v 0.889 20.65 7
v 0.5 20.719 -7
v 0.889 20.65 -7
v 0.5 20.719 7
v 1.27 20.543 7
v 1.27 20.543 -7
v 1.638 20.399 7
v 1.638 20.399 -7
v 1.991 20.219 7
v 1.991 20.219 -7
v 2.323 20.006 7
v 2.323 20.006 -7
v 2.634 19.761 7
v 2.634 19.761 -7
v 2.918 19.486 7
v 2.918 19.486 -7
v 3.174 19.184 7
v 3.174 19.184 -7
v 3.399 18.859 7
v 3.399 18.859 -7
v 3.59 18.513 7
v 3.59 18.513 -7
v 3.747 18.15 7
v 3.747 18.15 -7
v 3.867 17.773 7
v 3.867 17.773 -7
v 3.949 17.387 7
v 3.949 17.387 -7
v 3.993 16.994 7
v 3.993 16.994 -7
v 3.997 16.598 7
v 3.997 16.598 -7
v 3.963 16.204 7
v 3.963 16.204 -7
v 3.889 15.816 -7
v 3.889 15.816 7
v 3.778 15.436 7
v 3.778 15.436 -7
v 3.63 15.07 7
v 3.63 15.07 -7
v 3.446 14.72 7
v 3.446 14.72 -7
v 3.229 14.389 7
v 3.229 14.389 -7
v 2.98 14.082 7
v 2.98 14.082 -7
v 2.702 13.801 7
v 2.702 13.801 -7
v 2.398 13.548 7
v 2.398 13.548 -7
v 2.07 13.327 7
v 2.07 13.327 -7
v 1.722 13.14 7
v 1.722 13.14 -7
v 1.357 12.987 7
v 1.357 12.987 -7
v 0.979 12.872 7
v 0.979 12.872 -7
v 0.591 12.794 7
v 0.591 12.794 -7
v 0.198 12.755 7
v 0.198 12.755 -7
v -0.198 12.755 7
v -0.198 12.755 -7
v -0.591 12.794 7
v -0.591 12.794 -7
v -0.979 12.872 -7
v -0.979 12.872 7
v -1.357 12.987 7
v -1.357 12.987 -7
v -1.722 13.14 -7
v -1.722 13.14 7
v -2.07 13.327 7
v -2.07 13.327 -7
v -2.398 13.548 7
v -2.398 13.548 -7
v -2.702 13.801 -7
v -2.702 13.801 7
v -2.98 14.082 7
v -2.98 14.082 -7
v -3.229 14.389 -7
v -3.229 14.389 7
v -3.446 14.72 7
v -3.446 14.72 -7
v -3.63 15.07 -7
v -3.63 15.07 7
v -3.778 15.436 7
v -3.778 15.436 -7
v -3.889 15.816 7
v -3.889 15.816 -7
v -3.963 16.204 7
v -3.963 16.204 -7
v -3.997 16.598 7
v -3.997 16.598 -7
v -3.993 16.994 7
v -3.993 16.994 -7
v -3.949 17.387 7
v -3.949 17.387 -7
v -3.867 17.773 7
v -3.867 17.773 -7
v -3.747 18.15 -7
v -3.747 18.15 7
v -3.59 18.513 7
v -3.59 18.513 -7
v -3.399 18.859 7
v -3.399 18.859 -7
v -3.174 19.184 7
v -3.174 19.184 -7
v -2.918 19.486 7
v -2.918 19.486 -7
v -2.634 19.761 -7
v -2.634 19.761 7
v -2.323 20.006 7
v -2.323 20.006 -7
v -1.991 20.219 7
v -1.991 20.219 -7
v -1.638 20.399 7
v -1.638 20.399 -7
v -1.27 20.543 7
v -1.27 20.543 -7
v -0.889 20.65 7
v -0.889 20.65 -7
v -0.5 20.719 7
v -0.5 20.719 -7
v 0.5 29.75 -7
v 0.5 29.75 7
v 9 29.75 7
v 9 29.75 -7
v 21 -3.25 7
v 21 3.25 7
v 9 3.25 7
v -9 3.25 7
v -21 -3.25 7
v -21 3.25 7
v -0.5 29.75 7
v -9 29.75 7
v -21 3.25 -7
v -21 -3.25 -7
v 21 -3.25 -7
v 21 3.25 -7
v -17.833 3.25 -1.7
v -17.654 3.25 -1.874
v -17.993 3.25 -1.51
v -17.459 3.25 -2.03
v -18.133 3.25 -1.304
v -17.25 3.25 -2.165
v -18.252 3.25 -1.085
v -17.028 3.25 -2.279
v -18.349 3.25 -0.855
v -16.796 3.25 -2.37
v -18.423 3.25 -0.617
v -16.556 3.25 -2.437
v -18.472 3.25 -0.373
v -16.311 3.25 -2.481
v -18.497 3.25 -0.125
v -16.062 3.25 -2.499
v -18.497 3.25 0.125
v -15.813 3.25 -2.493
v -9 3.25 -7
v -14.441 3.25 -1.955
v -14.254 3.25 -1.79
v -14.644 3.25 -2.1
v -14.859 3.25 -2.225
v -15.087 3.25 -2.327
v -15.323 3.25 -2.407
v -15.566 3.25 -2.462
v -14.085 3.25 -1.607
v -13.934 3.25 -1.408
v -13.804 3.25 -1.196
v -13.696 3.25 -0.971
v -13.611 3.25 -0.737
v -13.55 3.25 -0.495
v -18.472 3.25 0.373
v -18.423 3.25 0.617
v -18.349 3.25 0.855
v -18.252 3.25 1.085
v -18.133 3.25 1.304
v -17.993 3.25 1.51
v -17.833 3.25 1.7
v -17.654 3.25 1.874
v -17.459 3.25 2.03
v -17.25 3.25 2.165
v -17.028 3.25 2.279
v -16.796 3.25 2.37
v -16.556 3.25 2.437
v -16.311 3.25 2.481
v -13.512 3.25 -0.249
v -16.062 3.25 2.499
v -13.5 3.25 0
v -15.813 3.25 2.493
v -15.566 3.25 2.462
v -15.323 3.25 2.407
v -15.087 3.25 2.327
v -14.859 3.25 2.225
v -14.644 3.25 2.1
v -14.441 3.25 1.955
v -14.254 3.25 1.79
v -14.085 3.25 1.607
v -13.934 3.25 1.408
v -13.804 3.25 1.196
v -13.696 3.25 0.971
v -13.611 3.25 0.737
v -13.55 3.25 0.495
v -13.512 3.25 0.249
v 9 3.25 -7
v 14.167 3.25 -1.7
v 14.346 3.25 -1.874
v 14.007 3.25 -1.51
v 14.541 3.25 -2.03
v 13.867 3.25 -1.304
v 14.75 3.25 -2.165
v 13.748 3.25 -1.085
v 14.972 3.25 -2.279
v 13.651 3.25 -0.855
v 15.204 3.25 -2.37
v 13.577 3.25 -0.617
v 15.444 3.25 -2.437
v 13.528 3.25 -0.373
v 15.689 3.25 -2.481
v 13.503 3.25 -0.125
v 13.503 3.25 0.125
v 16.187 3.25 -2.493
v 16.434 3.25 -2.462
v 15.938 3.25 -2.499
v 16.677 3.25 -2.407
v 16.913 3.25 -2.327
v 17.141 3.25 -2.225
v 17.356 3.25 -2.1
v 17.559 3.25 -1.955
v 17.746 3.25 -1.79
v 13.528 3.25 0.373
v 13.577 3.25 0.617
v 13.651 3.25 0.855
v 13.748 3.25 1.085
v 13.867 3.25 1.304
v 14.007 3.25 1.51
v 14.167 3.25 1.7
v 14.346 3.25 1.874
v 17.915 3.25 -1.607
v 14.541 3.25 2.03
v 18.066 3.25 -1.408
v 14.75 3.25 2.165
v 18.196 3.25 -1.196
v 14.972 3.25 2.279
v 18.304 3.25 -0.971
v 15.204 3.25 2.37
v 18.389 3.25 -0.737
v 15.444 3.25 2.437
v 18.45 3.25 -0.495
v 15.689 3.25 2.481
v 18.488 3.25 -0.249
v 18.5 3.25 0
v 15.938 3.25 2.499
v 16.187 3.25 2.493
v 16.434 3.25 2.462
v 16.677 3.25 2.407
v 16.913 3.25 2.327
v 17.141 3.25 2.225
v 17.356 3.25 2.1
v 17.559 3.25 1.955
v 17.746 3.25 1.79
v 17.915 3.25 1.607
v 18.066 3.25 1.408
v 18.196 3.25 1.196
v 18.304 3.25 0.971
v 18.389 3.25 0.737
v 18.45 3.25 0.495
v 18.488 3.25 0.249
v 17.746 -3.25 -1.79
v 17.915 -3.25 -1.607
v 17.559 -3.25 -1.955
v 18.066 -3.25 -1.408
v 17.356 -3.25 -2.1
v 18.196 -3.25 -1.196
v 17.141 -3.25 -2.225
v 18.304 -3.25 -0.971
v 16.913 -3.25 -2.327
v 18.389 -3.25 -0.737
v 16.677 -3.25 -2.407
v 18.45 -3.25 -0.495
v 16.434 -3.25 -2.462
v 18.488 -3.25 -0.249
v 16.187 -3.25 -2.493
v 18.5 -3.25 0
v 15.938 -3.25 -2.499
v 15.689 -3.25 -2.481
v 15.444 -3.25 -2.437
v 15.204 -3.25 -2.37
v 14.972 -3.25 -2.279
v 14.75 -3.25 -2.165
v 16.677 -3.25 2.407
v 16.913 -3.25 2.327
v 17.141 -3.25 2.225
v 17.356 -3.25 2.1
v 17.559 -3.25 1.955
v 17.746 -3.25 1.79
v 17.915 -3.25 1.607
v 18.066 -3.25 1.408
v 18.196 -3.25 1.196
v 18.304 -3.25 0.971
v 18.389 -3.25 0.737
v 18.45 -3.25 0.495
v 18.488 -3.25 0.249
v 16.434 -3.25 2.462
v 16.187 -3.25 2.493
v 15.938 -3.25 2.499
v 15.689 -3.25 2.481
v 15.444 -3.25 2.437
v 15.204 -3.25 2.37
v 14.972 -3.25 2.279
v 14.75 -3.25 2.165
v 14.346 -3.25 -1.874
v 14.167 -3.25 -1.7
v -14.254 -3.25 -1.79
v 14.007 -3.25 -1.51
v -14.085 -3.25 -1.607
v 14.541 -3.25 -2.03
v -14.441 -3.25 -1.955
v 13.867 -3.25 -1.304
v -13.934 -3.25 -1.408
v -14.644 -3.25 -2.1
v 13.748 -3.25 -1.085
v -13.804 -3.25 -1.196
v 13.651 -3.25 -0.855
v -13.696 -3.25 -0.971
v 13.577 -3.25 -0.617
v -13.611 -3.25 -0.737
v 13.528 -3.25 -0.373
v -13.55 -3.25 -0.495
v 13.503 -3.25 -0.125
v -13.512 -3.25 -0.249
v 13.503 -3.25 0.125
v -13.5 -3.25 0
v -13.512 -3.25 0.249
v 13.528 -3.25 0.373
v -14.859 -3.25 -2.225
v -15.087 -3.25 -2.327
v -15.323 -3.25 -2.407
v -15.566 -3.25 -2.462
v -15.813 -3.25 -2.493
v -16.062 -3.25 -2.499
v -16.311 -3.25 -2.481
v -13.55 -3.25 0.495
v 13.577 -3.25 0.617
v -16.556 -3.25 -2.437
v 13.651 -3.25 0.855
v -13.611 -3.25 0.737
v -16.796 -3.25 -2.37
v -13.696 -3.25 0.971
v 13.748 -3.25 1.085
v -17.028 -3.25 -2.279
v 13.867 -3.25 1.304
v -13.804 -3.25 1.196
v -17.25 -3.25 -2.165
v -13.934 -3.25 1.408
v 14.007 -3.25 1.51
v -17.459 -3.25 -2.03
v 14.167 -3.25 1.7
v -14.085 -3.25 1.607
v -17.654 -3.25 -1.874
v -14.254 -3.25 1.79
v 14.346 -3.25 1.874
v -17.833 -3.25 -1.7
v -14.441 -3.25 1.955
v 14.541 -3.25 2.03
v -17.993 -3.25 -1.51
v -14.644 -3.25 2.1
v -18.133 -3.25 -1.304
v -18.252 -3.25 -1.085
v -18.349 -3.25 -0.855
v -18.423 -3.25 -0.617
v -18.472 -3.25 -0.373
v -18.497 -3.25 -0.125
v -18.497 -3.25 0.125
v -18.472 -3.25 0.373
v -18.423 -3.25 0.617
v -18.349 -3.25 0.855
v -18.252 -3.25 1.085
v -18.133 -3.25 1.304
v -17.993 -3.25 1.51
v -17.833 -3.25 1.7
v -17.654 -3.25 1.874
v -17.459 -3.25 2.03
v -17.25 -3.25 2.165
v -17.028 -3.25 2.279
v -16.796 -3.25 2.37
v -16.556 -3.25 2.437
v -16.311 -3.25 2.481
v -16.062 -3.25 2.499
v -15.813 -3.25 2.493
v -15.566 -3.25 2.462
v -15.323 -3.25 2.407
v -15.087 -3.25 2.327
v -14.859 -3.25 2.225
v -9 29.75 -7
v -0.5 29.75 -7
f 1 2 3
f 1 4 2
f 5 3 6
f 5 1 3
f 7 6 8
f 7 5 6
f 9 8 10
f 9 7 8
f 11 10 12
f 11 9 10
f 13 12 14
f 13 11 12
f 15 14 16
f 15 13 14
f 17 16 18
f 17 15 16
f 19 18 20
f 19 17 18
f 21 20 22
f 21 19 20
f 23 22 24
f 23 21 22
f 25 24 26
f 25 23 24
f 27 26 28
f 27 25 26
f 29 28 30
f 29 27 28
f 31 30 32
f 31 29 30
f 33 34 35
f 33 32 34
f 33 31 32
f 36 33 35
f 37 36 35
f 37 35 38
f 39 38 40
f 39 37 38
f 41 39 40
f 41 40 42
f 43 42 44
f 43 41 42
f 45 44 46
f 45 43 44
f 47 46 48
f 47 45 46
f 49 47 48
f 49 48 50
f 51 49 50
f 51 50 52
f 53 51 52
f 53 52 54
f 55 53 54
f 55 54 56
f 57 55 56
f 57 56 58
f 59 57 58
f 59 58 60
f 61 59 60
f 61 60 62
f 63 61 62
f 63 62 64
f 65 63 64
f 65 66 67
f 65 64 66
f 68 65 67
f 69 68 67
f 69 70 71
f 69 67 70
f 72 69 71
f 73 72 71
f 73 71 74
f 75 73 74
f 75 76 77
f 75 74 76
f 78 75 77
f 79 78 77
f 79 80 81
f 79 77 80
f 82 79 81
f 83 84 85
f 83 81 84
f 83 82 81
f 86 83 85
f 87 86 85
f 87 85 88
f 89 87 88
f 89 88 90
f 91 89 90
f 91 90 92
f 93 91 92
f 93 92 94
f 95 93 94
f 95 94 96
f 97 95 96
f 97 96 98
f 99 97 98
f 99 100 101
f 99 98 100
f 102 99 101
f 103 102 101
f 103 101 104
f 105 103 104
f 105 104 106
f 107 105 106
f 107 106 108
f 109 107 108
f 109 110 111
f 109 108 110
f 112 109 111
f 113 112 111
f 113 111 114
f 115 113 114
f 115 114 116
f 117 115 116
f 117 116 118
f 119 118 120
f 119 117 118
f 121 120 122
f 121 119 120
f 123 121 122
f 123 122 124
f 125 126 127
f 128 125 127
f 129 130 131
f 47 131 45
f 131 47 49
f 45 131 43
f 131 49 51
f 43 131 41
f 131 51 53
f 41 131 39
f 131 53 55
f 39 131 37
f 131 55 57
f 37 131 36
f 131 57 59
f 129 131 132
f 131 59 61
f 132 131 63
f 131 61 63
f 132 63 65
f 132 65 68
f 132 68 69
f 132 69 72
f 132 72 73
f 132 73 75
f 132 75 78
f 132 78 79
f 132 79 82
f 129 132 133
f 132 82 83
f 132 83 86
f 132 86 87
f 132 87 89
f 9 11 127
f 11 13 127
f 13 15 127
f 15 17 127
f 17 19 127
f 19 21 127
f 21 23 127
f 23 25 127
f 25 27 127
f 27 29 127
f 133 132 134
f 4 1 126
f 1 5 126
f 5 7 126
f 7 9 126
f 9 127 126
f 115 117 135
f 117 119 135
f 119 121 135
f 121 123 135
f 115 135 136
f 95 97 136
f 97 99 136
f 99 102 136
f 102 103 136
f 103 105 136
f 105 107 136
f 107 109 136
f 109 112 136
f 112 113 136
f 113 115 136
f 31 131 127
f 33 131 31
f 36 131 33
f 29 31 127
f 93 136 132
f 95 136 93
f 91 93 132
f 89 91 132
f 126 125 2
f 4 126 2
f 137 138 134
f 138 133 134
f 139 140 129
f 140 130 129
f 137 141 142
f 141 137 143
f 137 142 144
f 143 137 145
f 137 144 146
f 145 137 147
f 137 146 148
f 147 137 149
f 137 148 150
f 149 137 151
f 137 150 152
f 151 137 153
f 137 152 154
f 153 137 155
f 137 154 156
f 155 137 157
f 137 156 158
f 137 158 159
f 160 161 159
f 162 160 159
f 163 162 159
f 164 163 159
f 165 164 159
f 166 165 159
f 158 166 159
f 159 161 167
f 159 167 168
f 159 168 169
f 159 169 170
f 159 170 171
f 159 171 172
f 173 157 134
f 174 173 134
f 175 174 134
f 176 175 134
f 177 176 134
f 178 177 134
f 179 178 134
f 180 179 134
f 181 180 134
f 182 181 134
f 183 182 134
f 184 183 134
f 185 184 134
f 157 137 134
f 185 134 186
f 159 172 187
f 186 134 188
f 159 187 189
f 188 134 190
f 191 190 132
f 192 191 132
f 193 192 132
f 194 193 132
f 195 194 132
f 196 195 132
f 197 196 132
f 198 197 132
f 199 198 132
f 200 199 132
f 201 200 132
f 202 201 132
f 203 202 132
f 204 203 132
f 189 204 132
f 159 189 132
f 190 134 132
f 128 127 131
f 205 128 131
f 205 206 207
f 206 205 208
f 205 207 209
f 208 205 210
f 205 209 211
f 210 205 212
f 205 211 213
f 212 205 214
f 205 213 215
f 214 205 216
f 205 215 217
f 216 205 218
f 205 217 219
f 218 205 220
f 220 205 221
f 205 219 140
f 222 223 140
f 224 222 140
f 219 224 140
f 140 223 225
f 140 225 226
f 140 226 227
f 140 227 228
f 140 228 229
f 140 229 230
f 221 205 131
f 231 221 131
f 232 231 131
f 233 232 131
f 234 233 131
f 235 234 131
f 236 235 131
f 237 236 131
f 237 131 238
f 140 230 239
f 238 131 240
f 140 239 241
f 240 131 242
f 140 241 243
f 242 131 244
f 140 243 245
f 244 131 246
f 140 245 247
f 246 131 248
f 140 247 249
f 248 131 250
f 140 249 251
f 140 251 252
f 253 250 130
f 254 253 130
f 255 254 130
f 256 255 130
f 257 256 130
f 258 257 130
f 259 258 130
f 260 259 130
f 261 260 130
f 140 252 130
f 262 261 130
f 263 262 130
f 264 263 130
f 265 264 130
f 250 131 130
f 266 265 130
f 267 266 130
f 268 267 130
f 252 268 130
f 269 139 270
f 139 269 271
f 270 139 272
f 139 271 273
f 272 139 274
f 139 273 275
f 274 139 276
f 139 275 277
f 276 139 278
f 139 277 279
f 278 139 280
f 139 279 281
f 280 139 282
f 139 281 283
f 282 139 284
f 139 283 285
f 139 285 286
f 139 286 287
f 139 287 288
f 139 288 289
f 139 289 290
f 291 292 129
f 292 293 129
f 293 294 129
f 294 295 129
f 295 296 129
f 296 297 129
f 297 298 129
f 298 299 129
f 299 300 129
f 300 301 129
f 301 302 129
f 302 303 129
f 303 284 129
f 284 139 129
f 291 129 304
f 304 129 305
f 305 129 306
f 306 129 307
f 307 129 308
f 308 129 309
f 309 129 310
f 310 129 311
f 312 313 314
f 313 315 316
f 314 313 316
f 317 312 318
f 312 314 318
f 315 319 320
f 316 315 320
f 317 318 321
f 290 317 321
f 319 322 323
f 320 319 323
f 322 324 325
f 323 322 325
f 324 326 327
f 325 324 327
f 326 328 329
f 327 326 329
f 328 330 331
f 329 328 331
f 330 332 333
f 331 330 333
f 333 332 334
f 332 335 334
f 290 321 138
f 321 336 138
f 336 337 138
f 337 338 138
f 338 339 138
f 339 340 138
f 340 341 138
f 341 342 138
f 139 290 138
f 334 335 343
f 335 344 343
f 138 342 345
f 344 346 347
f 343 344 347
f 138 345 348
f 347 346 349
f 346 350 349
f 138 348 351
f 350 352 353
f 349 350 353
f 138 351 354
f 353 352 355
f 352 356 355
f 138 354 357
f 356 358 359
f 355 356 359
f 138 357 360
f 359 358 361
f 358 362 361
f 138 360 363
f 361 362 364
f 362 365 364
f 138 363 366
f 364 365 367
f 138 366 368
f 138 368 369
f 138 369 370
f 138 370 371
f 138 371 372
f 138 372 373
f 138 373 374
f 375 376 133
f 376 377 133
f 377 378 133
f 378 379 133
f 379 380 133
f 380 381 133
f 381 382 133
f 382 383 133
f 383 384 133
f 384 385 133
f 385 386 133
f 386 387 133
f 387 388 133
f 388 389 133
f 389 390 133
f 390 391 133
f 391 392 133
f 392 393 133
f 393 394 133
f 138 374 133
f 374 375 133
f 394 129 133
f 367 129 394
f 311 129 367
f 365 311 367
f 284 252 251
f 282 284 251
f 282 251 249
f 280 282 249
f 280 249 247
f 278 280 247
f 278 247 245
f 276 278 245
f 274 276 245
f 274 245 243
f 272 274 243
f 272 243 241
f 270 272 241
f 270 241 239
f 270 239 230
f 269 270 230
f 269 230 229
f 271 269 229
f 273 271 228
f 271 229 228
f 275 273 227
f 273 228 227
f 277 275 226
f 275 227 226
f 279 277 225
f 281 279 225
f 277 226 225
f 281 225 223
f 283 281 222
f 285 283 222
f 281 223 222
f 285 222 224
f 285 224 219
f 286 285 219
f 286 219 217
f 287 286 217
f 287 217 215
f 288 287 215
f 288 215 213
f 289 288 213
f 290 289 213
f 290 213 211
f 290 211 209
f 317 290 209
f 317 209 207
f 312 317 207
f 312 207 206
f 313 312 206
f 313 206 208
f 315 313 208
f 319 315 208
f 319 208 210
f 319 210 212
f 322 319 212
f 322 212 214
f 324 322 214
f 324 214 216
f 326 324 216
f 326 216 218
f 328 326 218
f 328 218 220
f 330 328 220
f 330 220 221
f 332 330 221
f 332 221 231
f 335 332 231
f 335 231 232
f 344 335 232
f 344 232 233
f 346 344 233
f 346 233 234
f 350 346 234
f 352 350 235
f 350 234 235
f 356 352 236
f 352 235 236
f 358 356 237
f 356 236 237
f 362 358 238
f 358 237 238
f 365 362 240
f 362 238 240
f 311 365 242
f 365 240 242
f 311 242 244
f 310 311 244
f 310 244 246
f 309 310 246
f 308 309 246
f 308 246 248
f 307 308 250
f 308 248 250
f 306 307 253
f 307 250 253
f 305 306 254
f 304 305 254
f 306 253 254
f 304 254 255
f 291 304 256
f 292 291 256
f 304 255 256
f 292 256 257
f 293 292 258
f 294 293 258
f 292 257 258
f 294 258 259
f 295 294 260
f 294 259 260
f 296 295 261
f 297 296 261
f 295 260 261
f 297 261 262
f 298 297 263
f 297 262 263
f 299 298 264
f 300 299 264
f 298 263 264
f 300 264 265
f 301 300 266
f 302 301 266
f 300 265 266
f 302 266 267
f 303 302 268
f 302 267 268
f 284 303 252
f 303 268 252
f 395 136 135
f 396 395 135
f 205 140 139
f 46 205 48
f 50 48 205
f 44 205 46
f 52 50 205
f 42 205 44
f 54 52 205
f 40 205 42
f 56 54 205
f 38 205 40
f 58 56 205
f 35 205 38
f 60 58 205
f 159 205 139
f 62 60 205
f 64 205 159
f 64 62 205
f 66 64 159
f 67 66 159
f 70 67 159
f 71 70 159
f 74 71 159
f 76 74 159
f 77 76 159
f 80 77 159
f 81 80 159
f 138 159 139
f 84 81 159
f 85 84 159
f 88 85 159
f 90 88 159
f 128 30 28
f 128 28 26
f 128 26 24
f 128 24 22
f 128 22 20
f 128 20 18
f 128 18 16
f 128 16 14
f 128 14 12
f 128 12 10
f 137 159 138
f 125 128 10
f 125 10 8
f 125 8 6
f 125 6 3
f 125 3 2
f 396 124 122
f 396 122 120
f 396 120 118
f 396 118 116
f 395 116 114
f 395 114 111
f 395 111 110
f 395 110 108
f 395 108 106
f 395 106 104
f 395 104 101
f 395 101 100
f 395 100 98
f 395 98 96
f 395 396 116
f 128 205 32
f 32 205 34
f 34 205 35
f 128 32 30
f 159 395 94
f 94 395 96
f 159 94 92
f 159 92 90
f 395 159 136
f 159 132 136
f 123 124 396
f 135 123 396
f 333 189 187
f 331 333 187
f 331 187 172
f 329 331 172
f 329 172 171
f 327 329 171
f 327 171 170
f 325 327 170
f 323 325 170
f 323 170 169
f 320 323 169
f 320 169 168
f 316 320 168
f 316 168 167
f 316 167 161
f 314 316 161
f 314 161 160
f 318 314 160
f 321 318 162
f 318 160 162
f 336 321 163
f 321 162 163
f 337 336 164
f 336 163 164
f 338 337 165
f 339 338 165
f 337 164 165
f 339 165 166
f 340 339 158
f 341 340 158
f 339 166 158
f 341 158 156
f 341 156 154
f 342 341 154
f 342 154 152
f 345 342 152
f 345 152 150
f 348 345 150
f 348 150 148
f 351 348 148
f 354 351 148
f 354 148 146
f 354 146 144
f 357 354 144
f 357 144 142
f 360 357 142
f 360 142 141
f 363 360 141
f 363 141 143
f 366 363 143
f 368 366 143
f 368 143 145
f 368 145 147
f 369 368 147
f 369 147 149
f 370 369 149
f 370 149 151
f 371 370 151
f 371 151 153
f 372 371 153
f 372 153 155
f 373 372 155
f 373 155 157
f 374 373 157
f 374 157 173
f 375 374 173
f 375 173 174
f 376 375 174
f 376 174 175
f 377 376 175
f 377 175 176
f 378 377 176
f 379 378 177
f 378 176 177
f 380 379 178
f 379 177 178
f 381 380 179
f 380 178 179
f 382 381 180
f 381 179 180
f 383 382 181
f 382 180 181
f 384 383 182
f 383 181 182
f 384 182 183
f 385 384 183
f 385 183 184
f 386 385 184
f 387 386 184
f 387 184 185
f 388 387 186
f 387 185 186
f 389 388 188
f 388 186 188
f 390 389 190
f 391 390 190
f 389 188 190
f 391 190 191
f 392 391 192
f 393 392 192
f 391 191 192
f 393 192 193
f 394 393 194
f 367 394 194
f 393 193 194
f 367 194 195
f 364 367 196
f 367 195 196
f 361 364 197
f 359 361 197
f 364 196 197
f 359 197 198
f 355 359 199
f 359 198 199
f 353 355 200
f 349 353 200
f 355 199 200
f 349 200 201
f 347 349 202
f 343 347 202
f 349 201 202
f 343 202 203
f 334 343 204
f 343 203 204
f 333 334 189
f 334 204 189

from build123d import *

# Parameters (mm, degrees)
BOSS_EXTRUDE1_DEPTH      = 7
BOSS_EXTRUDE1_DEPTH_BACK = 7
CUT_EXTRUDE1_DEPTH       = 40.013619417
SKETCH3_R                = 2.5
CUT_EXTRUDE2_DEPTH       = 35.528973341


with BuildPart() as part:
    # Sketch1 → Boss-Extrude1 (new, two sides: drawn at the far end of the back side and taken through both)
    with BuildSketch(Plane.XY.offset(-BOSS_EXTRUDE1_DEPTH_BACK)):
        Polygon((9, 3.25), (21, 3.25), (21, -3.25), (-21, -3.25), (-21, 3.25), (-9, 3.25), (-9, 29.75), (9, 29.75), align=None)
    extrude(amount=BOSS_EXTRUDE1_DEPTH + BOSS_EXTRUDE1_DEPTH_BACK)

    # Sketch2 → Cut-Extrude1 (cut, through all)
    with BuildSketch(Plane.XY.offset(7)):
        with BuildLine():
            Line((-0.5, 20.718626967), (-0.5, 29.75))
            Line((-0.5, 29.75), (0.5, 29.75))
            Line((0.5, 29.75), (0.5, 20.718626967))
            ThreePointArc((0.5, 20.718626967), (0, 12.75), (-0.5, 20.718626967))
        make_face()
    extrude(amount=-CUT_EXTRUDE1_DEPTH, mode=Mode.SUBTRACT)

    # Sketch3 → Cut-Extrude2 (cut, through all)
    with BuildSketch(Plane(origin=(0, 3.25, 0), x_dir=(1, 0, 0), z_dir=(0, 1, 0))):
        with Locations((16, 0)):
            Circle(SKETCH3_R)
        with Locations((-16, 0)):
            Circle(SKETCH3_R)
    extrude(amount=-CUT_EXTRUDE2_DEPTH, mode=Mode.SUBTRACT)


solid = part.part
